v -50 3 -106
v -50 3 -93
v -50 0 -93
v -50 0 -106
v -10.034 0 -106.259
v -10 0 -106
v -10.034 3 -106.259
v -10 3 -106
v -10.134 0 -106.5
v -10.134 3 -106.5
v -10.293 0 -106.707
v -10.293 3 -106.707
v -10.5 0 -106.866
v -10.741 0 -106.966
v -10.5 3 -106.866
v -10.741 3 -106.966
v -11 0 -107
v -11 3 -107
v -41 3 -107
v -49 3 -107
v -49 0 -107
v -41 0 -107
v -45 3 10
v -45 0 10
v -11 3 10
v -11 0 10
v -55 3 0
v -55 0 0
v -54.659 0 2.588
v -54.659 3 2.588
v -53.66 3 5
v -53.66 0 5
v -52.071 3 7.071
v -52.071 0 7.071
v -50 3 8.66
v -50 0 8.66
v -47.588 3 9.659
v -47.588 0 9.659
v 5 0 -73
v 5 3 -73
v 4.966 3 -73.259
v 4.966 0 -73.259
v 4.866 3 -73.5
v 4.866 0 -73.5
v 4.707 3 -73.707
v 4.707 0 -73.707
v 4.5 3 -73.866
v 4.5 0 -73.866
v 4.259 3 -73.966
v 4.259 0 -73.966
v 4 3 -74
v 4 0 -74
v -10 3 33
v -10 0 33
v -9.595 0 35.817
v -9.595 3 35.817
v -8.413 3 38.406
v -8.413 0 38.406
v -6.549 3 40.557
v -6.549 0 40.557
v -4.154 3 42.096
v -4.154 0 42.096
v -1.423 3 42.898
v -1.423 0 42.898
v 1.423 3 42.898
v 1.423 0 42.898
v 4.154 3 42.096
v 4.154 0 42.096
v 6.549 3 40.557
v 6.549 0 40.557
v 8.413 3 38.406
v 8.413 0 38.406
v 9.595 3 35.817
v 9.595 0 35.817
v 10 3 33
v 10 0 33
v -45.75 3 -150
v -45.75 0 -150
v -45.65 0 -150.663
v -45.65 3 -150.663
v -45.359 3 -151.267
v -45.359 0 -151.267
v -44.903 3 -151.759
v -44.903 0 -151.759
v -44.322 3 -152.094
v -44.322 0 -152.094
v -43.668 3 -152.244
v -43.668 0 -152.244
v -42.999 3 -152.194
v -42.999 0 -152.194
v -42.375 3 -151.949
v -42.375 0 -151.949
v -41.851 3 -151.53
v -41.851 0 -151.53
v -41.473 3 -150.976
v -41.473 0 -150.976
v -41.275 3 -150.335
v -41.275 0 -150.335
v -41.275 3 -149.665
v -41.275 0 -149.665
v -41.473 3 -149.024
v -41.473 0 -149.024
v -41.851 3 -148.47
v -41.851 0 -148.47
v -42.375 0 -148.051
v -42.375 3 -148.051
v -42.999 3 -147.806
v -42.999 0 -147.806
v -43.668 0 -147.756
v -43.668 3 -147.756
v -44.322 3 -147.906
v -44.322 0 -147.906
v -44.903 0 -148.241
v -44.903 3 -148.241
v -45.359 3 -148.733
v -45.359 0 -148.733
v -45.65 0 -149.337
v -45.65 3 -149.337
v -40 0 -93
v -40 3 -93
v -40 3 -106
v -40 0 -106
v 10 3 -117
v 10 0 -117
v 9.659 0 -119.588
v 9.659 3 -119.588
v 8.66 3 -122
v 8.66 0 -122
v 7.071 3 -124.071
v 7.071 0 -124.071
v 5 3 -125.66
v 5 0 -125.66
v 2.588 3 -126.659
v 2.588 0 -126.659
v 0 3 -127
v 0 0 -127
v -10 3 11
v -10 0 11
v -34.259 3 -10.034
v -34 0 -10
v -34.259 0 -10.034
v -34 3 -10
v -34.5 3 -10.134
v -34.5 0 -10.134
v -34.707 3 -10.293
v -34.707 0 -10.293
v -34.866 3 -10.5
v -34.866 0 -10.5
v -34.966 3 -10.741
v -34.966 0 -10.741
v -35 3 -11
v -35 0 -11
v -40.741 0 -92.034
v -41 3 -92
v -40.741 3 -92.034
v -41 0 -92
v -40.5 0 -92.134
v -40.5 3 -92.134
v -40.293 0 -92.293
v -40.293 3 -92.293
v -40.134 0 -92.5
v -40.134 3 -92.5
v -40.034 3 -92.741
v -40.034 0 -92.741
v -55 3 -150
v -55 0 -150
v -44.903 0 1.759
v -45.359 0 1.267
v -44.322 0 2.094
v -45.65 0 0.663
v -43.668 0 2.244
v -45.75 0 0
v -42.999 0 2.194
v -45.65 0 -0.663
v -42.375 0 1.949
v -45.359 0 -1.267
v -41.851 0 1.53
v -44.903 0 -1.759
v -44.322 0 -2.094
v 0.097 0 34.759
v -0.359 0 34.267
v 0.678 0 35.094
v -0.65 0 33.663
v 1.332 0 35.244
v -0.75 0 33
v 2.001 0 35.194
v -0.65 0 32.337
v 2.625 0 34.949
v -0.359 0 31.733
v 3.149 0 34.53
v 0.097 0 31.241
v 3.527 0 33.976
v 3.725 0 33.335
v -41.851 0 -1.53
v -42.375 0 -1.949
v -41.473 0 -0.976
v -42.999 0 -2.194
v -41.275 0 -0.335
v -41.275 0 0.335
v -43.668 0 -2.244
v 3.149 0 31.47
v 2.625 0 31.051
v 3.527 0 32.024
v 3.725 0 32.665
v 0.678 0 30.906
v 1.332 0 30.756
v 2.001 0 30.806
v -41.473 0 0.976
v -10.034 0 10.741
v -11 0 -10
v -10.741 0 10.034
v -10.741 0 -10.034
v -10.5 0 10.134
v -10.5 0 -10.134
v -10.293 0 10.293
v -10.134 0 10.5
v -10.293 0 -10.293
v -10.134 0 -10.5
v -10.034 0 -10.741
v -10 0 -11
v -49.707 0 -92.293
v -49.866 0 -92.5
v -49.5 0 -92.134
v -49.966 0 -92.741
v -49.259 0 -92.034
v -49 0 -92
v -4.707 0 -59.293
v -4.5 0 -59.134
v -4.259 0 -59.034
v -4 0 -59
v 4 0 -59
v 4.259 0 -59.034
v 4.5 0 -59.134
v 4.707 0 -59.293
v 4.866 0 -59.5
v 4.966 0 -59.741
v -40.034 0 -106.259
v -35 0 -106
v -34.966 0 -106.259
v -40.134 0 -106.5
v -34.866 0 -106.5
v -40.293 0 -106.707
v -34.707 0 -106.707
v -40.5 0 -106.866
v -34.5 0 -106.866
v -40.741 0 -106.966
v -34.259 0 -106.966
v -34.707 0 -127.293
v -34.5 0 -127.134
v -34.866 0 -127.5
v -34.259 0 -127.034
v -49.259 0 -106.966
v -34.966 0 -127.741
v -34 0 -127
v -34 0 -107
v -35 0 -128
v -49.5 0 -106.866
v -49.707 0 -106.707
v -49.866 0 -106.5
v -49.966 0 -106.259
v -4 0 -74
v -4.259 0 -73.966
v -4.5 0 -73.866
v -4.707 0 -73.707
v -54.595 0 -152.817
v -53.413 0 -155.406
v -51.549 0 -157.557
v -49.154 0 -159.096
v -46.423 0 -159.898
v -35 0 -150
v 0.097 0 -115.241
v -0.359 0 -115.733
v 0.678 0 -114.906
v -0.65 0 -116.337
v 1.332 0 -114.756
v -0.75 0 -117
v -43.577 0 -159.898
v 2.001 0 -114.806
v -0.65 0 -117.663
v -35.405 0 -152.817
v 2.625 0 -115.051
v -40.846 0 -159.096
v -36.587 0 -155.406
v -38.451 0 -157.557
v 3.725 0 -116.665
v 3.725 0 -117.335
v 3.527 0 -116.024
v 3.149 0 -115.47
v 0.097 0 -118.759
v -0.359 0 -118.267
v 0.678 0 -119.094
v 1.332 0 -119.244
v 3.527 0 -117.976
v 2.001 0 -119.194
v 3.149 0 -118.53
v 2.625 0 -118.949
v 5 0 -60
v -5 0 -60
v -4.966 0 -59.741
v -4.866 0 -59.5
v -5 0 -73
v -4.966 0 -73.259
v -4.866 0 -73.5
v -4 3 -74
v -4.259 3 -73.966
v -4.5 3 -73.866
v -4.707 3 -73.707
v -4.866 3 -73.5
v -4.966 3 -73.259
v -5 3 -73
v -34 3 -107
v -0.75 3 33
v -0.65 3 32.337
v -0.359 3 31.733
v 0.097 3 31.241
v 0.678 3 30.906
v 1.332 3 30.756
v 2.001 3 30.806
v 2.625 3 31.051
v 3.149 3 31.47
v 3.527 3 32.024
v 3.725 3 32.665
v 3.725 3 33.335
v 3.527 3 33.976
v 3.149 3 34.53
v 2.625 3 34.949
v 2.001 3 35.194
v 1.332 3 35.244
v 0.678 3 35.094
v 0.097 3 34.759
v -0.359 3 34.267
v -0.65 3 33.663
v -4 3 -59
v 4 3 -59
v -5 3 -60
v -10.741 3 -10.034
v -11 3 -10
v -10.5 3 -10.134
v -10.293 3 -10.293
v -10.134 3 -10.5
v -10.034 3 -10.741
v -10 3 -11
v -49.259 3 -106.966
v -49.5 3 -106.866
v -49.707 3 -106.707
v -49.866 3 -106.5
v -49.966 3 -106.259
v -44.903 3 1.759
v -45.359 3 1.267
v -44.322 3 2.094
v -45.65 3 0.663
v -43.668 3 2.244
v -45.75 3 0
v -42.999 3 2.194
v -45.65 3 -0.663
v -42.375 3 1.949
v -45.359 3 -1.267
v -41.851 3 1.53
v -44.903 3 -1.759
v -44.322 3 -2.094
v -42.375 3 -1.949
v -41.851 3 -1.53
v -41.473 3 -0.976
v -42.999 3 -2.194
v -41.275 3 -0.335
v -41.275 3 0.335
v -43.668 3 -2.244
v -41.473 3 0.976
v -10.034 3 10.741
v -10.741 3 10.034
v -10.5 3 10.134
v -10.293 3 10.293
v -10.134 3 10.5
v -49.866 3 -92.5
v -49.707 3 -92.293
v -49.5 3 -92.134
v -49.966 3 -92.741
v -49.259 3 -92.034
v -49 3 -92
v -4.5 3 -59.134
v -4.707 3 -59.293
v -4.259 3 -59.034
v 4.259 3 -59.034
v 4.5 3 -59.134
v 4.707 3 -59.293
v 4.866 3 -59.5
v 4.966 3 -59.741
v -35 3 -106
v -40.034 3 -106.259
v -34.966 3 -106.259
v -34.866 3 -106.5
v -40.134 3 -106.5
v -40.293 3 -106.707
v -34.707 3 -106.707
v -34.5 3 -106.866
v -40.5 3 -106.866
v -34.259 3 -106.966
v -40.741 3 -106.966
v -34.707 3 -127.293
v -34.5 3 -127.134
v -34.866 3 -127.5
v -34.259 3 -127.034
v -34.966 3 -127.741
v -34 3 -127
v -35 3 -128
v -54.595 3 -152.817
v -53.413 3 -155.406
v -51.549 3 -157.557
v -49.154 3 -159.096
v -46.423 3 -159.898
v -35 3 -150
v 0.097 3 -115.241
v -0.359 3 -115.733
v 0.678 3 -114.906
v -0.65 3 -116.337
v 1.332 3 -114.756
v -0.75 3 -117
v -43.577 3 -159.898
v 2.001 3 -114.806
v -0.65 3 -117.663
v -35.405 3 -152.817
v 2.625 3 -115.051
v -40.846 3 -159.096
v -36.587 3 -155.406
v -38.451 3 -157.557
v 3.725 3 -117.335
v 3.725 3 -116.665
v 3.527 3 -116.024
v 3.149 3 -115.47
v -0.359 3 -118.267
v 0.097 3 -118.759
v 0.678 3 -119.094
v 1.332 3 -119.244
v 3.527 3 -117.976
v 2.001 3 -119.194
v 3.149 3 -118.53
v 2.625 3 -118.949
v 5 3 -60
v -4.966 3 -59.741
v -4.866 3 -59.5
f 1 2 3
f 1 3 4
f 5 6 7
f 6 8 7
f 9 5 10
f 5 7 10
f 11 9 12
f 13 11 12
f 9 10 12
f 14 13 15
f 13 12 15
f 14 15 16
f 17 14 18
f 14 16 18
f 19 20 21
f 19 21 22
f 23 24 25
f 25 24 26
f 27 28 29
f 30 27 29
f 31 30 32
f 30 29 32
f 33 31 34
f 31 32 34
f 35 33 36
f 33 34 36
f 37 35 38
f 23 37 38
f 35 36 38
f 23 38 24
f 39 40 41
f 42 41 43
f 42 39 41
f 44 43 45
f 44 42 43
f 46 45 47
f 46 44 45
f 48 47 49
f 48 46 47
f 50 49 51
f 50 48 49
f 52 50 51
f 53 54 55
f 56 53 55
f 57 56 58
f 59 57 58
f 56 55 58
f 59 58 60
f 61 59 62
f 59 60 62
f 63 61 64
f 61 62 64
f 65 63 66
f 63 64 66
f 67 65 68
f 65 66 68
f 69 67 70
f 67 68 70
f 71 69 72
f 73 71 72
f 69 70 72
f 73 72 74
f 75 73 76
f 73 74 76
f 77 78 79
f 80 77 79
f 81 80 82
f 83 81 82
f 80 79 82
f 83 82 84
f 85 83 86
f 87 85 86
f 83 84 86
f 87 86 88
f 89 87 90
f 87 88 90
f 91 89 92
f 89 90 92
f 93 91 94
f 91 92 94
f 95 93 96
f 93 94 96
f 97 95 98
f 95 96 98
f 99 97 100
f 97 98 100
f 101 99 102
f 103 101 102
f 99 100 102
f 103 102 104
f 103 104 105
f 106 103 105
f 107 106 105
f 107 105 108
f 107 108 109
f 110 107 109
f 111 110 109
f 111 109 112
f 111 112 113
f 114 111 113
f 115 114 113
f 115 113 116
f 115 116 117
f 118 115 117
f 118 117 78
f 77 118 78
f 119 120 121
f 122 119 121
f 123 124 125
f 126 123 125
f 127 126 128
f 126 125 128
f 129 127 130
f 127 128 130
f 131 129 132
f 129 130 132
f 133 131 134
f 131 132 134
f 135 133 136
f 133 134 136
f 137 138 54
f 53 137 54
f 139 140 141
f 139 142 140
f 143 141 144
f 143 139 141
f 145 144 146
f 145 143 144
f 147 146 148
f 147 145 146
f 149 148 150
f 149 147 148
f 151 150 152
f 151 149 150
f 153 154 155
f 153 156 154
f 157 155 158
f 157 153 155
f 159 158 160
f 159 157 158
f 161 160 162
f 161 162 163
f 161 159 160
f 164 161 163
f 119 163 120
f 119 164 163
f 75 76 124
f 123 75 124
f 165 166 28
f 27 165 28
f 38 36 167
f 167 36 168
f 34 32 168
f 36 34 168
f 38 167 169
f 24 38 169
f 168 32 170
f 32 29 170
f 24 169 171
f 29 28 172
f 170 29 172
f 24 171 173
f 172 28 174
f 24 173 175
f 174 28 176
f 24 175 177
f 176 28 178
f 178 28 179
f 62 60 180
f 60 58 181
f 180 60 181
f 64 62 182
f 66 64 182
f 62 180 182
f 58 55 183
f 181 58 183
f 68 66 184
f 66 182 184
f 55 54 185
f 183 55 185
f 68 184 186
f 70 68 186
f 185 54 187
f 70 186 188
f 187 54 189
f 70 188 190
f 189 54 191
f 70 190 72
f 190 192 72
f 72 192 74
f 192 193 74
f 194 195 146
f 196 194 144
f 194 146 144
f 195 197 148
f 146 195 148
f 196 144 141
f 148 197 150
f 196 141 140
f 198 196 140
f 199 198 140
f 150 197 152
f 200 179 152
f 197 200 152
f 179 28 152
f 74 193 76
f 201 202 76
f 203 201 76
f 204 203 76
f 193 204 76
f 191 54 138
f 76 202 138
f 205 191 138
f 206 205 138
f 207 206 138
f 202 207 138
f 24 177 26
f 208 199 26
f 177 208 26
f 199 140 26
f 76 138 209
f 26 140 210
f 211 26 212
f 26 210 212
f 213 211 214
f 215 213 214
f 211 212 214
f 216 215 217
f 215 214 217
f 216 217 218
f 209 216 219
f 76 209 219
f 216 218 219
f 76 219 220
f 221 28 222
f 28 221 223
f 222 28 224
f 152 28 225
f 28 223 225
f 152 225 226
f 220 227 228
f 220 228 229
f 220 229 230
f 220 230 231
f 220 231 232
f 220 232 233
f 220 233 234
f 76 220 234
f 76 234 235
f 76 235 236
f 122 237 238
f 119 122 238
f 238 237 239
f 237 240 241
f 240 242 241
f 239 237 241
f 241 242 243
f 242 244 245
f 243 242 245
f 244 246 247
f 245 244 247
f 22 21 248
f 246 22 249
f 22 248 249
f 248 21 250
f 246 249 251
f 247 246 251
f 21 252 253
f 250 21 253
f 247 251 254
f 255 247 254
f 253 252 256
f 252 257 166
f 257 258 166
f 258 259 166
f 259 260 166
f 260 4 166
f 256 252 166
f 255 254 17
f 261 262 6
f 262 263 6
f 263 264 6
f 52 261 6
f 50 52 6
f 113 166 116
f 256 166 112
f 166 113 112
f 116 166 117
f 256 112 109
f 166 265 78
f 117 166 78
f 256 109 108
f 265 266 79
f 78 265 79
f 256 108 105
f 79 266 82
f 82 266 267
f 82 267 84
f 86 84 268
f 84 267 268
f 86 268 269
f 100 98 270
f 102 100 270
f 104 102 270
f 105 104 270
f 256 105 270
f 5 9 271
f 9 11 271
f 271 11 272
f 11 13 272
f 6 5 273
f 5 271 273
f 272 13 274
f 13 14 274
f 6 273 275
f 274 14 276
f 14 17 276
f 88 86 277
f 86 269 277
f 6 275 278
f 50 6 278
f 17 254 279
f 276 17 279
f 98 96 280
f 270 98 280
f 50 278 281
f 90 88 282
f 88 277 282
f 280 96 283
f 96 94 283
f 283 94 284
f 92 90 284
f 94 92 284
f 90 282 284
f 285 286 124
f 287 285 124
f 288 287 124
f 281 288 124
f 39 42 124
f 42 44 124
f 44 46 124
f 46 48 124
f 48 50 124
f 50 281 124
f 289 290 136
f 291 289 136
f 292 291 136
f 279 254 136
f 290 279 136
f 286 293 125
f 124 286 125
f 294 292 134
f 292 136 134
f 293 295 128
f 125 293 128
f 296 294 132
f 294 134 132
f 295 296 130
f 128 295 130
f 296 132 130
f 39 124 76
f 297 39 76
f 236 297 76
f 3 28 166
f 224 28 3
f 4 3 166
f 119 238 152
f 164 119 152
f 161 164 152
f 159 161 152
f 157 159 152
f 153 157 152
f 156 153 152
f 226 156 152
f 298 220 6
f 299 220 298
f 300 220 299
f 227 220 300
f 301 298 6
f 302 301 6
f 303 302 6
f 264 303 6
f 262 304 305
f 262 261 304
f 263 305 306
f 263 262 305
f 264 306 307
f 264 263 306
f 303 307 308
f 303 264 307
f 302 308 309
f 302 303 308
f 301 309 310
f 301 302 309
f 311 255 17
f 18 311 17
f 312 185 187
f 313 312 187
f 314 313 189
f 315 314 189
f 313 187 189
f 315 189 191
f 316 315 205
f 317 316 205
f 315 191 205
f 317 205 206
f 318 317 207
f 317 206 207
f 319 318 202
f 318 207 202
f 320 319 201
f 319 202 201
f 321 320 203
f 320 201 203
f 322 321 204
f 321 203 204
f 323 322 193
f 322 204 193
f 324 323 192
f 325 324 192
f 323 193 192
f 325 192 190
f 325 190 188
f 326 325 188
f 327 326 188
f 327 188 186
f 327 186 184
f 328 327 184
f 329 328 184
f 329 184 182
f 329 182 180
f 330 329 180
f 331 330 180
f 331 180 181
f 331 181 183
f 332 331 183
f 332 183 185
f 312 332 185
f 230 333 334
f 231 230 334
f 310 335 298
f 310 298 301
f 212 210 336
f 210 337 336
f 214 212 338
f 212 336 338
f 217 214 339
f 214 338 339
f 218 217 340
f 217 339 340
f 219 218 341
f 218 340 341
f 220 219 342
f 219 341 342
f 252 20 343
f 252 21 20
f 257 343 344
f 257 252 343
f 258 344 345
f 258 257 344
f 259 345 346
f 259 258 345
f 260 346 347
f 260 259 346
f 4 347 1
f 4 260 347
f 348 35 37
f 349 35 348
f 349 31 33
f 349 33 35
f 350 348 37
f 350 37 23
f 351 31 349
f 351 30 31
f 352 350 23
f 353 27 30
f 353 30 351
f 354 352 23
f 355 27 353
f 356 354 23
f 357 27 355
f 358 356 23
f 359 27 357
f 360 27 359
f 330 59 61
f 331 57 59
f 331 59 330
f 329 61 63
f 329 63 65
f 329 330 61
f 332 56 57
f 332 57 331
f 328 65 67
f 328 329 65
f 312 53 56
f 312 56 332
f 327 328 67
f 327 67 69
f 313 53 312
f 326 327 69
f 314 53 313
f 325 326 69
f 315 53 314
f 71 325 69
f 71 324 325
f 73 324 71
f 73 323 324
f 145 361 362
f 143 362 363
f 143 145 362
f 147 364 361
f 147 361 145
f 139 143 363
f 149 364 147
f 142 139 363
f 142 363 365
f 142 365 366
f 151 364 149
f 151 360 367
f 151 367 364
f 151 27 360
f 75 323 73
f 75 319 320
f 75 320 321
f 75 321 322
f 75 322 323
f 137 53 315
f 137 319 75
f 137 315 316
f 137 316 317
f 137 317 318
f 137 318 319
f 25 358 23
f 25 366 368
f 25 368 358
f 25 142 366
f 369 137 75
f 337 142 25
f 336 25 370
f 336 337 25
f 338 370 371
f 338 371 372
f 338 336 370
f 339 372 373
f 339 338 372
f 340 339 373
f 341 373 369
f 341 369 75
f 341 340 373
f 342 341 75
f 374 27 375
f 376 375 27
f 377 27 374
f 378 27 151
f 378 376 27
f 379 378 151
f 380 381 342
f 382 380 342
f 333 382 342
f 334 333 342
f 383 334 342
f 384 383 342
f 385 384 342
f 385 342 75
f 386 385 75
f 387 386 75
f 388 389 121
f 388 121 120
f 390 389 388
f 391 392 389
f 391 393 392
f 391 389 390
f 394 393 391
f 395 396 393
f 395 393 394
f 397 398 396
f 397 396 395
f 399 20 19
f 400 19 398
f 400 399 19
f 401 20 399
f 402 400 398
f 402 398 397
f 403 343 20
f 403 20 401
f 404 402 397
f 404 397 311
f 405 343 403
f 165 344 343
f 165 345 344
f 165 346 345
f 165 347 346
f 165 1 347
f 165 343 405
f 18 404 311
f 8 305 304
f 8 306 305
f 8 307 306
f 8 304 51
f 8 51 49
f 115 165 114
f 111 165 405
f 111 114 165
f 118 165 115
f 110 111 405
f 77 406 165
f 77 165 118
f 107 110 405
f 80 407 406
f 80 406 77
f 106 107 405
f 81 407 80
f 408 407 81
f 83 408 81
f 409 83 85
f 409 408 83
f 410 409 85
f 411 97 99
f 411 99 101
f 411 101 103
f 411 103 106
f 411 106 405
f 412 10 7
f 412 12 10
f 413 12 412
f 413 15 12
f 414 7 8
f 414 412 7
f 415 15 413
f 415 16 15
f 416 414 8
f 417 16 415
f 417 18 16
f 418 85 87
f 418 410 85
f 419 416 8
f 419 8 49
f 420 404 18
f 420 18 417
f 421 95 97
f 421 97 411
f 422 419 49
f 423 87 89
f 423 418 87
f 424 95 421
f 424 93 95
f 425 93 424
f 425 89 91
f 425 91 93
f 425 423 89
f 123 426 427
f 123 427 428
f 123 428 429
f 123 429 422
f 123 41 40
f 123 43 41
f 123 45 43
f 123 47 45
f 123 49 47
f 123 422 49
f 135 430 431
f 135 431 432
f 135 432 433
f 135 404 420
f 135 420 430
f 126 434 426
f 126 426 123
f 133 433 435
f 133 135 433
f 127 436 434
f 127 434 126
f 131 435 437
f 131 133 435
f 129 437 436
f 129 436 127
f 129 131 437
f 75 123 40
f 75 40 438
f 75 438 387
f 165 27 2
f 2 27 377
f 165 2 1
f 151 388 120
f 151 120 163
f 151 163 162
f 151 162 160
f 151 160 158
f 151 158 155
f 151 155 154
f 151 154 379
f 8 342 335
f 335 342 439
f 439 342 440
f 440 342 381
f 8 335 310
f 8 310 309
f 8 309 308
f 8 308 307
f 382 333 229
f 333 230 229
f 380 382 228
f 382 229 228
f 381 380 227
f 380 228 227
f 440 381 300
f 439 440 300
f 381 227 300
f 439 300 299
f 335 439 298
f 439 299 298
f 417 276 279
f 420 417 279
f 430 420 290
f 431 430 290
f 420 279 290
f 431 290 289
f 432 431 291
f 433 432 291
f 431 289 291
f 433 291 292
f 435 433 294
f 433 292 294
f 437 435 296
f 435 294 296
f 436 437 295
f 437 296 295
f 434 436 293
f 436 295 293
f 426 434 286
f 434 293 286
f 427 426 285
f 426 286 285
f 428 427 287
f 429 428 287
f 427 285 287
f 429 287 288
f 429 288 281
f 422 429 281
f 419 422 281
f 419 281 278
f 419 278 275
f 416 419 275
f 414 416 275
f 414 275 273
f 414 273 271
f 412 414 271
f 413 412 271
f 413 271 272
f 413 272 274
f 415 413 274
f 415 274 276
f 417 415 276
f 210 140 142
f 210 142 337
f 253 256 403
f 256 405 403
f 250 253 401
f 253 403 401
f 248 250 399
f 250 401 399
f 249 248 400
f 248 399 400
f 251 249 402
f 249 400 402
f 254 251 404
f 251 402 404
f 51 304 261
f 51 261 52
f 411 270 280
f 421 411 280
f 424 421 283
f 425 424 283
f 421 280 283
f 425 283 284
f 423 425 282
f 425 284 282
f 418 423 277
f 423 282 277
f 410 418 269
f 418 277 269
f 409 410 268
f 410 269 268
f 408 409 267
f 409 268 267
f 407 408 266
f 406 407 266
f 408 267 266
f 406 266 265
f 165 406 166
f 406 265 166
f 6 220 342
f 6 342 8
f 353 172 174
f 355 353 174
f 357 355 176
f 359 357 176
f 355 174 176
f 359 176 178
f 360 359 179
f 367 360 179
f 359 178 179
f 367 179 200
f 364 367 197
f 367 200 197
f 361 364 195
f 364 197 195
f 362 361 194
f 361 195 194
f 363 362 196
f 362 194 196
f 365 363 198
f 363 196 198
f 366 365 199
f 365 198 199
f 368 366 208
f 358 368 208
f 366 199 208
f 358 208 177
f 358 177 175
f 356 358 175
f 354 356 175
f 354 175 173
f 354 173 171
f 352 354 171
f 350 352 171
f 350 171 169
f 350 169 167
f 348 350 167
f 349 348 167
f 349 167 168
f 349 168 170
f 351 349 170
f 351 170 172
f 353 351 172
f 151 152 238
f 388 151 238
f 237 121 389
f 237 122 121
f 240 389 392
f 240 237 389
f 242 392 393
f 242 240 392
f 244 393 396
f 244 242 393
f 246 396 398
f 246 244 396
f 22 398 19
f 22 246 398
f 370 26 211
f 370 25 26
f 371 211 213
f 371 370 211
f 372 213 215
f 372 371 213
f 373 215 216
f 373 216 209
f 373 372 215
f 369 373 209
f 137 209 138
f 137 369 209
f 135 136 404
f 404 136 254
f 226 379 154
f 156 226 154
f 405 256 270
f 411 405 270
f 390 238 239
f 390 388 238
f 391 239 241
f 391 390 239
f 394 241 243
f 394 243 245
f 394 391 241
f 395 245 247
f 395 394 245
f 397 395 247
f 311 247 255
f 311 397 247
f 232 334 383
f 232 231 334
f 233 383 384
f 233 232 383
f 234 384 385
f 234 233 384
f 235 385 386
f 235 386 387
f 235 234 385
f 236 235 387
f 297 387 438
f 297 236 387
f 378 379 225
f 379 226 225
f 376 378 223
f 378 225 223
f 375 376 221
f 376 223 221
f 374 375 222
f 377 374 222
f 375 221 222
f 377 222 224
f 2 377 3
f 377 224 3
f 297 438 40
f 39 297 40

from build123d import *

# Parameters (mm, degrees)
SKETCH1_W            = 25
SKETCH1_H            = 97
BOSS_EXTRUDE1_DEPTH  = 3
SKETCH4_W            = 10
SKETCH4_H            = 15
CUT_EXTRUDE1_DEPTH   = 170.215838502
FILLET2_R            = 1
M4_CLEARANCE_HOLE1_D = 4.5


with BuildPart() as part:
    # Sketch1 → Boss-Extrude1 (new body)
    with BuildSketch(Plane(origin=(0, 0, 0), x_dir=(1, 0, 0), z_dir=(0, 1, 0))):
        with BuildLine():
            Line((-45, -10), (-10, -10))
            Line((-10, -10), (-10, -33))
            ThreePointArc((-10, -33), (0, -43), (10, -33))
            Line((10, -33), (10, 117))
            ThreePointArc((10, 117), (7.071067812, 124.071067812), (0, 127))
            Line((0, 127), (-35, 127))
            Line((-35, 127), (-35, 150))
            ThreePointArc((-35, 150), (-45, 160), (-55, 150))
            Line((-55, 150), (-55, 0))
            ThreePointArc((-55, 0), (-52.071067812, -7.071067812), (-45, -10))
        make_face()
        with Locations((-22.5, 58.5)):
            Rectangle(SKETCH1_W, SKETCH1_H, mode=Mode.SUBTRACT)
    extrude(amount=BOSS_EXTRUDE1_DEPTH)

    # Sketch4 → Cut-Extrude1 (cut, through all)
    with BuildSketch(Plane(origin=(0, 3, 0), x_dir=(1, 0, 0), z_dir=(0, 1, 0))):
        with Locations((-45, 99.5)):
            Rectangle(SKETCH4_W, SKETCH4_H)
        with Locations((0, 66.5)):
            Rectangle(SKETCH4_W, SKETCH4_H)
    extrude(amount=-CUT_EXTRUDE1_DEPTH, mode=Mode.SUBTRACT)

    # Fillet2
    fillet2_edges = [part.edges().sort_by_distance(p)[0] for p in [
        (-35, 1.5, -127),
        (-10, 1.5, 10),
        (-35, 1.5, -107),
        (-35, 1.5, -10),
        (-10, 1.5, -10),
        (-10, 1.5, -107),
        (-50, 1.5, -92),
        (-50, 1.5, -107),
        (-40, 1.5, -107),
        (-40, 1.5, -92),
        (-5, 1.5, -59),
        (-5, 1.5, -74),
        (5, 1.5, -74),
        (5, 1.5, -59),
    ]]
    fillet(fillet2_edges, radius=FILLET2_R)

    # M4 Clearance Hole1 (through all)
    with Locations(Plane(origin=(0, 3, 0), x_dir=(1, 0, 0), z_dir=(0, 1, 0))):
        with Locations((-43.5, 150), (1.5, 117), (-43.5, 0), (1.5, -33)):
            Hole(M4_CLEARANCE_HOLE1_D / 2)


solid = part.part
